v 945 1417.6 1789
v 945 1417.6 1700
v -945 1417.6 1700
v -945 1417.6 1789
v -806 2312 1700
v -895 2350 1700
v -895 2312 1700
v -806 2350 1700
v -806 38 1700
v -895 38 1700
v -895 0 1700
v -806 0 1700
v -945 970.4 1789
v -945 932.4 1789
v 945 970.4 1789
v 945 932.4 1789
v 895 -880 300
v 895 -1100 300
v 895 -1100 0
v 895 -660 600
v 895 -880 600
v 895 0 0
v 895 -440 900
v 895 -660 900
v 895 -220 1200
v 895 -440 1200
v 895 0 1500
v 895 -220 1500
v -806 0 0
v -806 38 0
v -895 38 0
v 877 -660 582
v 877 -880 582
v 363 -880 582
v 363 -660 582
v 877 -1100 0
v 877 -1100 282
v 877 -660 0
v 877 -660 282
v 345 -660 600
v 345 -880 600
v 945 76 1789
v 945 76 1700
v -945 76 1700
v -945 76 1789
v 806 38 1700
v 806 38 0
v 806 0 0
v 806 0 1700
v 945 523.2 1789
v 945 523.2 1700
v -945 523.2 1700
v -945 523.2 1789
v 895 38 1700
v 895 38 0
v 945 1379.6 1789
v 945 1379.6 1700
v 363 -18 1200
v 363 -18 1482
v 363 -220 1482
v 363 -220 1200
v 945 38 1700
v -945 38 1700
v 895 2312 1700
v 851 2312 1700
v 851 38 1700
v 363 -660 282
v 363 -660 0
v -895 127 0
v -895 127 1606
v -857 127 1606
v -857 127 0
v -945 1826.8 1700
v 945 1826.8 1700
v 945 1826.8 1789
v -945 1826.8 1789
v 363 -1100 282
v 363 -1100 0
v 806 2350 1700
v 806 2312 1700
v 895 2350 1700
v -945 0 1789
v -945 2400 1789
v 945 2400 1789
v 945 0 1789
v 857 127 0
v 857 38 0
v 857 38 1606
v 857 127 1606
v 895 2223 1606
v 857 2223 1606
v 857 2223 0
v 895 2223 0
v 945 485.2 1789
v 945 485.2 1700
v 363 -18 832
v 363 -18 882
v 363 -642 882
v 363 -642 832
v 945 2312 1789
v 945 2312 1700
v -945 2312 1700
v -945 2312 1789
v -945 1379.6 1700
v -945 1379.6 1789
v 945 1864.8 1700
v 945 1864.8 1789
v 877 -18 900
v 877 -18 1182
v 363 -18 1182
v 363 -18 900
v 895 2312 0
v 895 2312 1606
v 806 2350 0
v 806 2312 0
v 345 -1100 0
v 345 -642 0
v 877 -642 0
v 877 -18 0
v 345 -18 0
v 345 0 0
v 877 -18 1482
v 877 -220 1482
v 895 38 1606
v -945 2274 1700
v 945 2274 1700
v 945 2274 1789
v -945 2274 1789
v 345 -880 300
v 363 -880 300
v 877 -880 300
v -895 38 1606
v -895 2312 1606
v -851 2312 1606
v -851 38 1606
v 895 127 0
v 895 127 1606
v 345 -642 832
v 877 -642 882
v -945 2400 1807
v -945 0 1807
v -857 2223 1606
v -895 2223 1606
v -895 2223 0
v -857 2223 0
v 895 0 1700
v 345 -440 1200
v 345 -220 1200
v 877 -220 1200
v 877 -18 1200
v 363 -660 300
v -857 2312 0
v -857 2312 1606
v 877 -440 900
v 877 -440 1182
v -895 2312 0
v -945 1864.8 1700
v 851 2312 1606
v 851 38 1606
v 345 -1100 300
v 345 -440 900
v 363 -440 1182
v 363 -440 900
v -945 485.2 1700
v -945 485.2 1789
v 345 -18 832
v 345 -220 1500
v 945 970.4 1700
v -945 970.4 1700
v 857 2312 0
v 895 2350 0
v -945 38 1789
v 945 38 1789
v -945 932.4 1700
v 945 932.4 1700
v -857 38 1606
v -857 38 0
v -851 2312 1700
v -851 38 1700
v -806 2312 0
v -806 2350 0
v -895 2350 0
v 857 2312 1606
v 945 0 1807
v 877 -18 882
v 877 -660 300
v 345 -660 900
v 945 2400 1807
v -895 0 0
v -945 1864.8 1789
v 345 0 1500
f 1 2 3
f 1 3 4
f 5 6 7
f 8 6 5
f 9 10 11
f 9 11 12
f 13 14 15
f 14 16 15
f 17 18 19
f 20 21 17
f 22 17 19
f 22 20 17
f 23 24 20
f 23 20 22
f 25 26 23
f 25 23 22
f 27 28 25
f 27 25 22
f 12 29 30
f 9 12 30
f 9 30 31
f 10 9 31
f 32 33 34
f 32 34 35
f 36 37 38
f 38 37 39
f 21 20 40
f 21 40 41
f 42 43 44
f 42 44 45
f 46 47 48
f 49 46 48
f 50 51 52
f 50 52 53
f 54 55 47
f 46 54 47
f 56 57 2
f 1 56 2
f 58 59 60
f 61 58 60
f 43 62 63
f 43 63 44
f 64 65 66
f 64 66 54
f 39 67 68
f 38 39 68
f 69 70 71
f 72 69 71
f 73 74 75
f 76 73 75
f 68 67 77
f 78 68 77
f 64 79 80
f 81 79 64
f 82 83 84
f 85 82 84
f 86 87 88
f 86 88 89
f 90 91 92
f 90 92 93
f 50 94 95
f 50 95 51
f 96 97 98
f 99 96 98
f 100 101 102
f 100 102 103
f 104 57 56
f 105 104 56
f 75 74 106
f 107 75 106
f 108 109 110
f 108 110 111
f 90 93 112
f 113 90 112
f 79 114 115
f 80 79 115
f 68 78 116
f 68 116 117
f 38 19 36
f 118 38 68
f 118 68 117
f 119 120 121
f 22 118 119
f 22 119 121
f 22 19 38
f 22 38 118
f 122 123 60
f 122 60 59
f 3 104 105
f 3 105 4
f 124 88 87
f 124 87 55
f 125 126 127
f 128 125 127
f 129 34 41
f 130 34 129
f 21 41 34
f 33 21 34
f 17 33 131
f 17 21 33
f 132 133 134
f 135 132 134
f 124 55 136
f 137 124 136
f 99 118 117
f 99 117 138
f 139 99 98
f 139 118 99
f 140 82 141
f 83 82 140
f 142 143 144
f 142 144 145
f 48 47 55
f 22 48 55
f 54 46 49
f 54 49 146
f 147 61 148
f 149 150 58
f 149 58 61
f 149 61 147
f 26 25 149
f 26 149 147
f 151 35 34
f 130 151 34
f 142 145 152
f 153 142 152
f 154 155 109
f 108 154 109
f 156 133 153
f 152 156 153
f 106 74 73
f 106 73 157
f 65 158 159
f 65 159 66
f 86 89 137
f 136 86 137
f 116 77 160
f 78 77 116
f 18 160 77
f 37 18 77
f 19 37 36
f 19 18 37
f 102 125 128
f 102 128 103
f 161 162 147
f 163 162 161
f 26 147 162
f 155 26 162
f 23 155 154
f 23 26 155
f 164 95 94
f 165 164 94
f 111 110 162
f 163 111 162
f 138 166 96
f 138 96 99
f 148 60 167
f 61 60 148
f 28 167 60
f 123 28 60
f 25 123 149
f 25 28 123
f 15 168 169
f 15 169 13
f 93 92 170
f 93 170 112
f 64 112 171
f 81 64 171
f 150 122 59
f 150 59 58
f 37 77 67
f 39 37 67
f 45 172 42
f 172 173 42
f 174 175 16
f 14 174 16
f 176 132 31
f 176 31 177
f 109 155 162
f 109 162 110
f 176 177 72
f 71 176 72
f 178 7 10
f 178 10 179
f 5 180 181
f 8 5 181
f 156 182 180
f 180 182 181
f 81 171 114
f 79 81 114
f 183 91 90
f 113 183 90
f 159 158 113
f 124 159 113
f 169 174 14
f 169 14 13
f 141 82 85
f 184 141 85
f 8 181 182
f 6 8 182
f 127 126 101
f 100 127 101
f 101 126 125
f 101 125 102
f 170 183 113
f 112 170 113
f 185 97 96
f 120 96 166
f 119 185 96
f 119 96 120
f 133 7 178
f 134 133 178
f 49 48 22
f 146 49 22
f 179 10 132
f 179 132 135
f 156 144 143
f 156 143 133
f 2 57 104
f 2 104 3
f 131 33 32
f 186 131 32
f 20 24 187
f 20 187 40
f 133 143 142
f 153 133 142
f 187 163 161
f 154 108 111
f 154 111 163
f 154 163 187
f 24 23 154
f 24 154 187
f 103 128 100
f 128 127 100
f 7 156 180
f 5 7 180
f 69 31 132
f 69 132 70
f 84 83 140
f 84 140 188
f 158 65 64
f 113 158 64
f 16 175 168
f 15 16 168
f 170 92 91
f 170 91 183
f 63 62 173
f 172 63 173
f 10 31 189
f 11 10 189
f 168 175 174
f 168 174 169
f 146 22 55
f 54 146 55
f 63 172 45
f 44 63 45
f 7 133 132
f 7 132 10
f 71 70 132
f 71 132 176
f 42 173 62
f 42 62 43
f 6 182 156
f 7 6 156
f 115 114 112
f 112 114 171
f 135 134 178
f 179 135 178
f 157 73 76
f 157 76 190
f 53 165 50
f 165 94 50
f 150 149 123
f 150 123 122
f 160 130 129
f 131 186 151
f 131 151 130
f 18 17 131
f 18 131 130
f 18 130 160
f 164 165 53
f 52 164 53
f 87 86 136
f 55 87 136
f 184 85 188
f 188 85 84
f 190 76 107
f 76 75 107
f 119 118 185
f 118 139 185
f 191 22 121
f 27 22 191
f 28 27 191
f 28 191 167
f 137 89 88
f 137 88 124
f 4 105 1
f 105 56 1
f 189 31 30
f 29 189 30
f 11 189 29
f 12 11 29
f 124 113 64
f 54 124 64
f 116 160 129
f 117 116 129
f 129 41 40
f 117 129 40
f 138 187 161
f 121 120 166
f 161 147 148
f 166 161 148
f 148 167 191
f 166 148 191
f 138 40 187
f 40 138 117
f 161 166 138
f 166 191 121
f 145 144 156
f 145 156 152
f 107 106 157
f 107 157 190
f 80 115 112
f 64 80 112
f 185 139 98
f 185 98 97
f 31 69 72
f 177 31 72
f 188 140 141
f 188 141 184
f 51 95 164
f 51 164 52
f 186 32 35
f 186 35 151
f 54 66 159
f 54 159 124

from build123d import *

# Parameters (mm, degrees)
F1_DEPTH      = 1700
F0_W          = 38
F0_H          = 89
F2_DEPTH      = 1606
F3_W          = 44
F3_H          = 94
F4_DEPTH      = 2274
F5_W          = 38
F5_H          = 89
F6_DEPTH      = 945
F6_DEPTH_BACK = 945
F7_W          = 1890
F7_H          = 2400
F8_DEPTH      = 18
F10_DEPTH     = 550
F12_DEPTH     = 18
F13_W         = 624
F13_H         = 50
F14_DEPTH     = 18


with BuildPart() as f1:
    # F0 (on Top) → F1 (new body)
    with BuildSketch(Plane.XY):
        Polygon((-806, 2350), (-895, 2350), (-895, 2312), (-857, 2312), (-806, 2312), align=None)
    extrude(amount=F1_DEPTH)


with BuildPart() as f1b:
    # F0 (on Top) → F1, piece 2 (new body)
    with BuildSketch(Plane.XY):
        Polygon((895, 2350), (806, 2350), (806, 2312), (857, 2312), (895, 2312), align=None)
    extrude(amount=F1_DEPTH)


with BuildPart() as f1c:
    # F0 (on Top) → F1, piece 3 (new body)
    with BuildSketch(Plane.XY):
        Polygon((895, 0), (895, 38), (857, 38), (806, 38), (806, 0), align=None)
    extrude(amount=F1_DEPTH)


with BuildPart() as f1d:
    # F0 (on Top) → F1, piece 4 (new body)
    with BuildSketch(Plane.XY):
        Polygon((-895, 38), (-895, 0), (-806, 0), (-806, 38), (-857, 38), align=None)
    extrude(amount=F1_DEPTH)


with BuildPart() as f2:
    # F0 (on Top) → F2 (new body)
    with BuildSketch(Plane.XY):
        with Locations((-876, 2267.5)):
            Rectangle(F0_W, F0_H)
    extrude(amount=F2_DEPTH)


with BuildPart() as f2b:
    # F0 (on Top) → F2, piece 2 (new body)
    with BuildSketch(Plane.XY):
        with Locations((876, 2267.5)):
            Rectangle(F0_W, F0_H)
    extrude(amount=F2_DEPTH)


with BuildPart() as f2c:
    # F0 (on Top) → F2, piece 3 (new body)
    with BuildSketch(Plane.XY):
        with Locations((876, 82.5)):
            Rectangle(F0_W, F0_H)
    extrude(amount=F2_DEPTH)


with BuildPart() as f2d:
    # F0 (on Top) → F2, piece 4 (new body)
    with BuildSketch(Plane.XY):
        with Locations((-876, 82.5)):
            Rectangle(F0_W, F0_H)
    extrude(amount=F2_DEPTH)


with BuildPart() as f4:
    # F3 (on face) → F4 (new body, through all)
    with BuildSketch(Plane.XZ.offset(-2312)):
        with Locations((-873, 1653)):
            Rectangle(F3_W, F3_H)
    extrude(amount=F4_DEPTH)


with BuildPart() as f4b:
    # F3 (on face) → F4, piece 2 (new body, through all)
    with BuildSketch(Plane.XZ.offset(-2312)):
        with Locations((873, 1653)):
            Rectangle(F3_W, F3_H)
    extrude(amount=F4_DEPTH)


with BuildPart() as f6:
    # F5 (on Right) → F6 (new body, two sides)
    with BuildSketch(Plane.YZ) as f6_sk:
        with Locations((504.2, 1744.5)):
            Rectangle(F5_W, F5_H)
    extrude(amount=F6_DEPTH)
    extrude(f6_sk.sketch, amount=-F6_DEPTH_BACK)


with BuildPart() as f6b:
    # F5 (on Right) → F6, piece 2 (new body, two sides)
    with BuildSketch(Plane.YZ) as f6_2_sk:
        with Locations((951.4, 1744.5)):
            Rectangle(F5_W, F5_H)
    extrude(amount=F6_DEPTH)
    extrude(f6_2_sk.sketch, amount=-F6_DEPTH_BACK)


with BuildPart() as f6c:
    # F5 (on Right) → F6, piece 3 (new body, two sides)
    with BuildSketch(Plane.YZ) as f6_3_sk:
        with Locations((1398.6, 1744.5)):
            Rectangle(F5_W, F5_H)
    extrude(amount=F6_DEPTH)
    extrude(f6_3_sk.sketch, amount=-F6_DEPTH_BACK)


with BuildPart() as f6d:
    # F5 (on Right) → F6, piece 4 (new body, two sides)
    with BuildSketch(Plane.YZ) as f6_4_sk:
        with Locations((1845.8, 1744.5)):
            Rectangle(F5_W, F5_H)
    extrude(amount=F6_DEPTH)
    extrude(f6_4_sk.sketch, amount=-F6_DEPTH_BACK)


with BuildPart() as f6e:
    # F5 (on Right) → F6, piece 5 (new body, two sides)
    with BuildSketch(Plane.YZ) as f6_5_sk:
        with Locations((57, 1744.5)):
            Rectangle(F5_W, F5_H)
    extrude(amount=F6_DEPTH)
    extrude(f6_5_sk.sketch, amount=-F6_DEPTH_BACK)


with BuildPart() as f6f:
    # F5 (on Right) → F6, piece 6 (new body, two sides)
    with BuildSketch(Plane.YZ) as f6_6_sk:
        with Locations((2293, 1744.5)):
            Rectangle(F5_W, F5_H)
    extrude(amount=F6_DEPTH)
    extrude(f6_6_sk.sketch, amount=-F6_DEPTH_BACK)


with BuildPart() as f8:
    # F7 (on face) → F8 (new body)
    with BuildSketch(Plane.XY.offset(1789)):
        with Locations((0, 1200)):
            Rectangle(F7_W, F7_H)
    extrude(amount=F8_DEPTH)


with BuildPart() as f10:
    # F9 (on face) → F10 (new body)
    with BuildSketch(Plane.YZ.offset(895)):
        Polygon((-660, 582), (-660, 600), (-880, 600), (-880, 582), (-862, 582), align=None)
        Polygon((-202, 1200), (-220, 1200), (-440, 1200), (-440, 1182), (-422, 1182), (-202, 1182), (-18, 1182), (-18, 1200), align=None)
        Polygon((-862, 282), (-660, 282), (-660, 300), (-862, 300), (-880, 300), (-1100, 300), (-1100, 282), (-1082, 282), align=None)
        Polygon((0, 1200), (0, 1500), (-220, 1500), (-220, 1482), (-202, 1482), (-18, 1482), (-18, 1200), (-18, 1182), (-18, 900), (-18, 882), (-18, 0), (0, 0), (0, 1182), align=None)
        Polygon((-660, 0), (-642, 0), (-642, 582), (-642, 882), (-422, 882), (-18, 882), (-18, 900), (-422, 900), (-440, 900), (-660, 900), (-660, 600), (-660, 582), (-660, 300), (-660, 282), align=None)
    extrude(amount=-F10_DEPTH)

    # F11 (on face) → F12 (join)
    with BuildSketch(Plane.YZ.offset(895)):
        Polygon((0, 0), (0, 1500), (-220, 1500), (-220, 1200), (-440, 1200), (-440, 900), (-660, 900), (-660, 600), (-880, 600), (-880, 300), (-1100, 300), (-1100, 0), align=None)
    extrude(amount=-F12_DEPTH)

    # F13 (on face) → F14 (join)
    with BuildSketch(Plane(origin=(345, 0, 0), x_dir=(0, -1, 0), z_dir=(-1, 0, 0))):
        Polygon((220, 1500), (0, 1500), (0, 900), (440, 900), (440, 1200), (220, 1200), align=None)
        Polygon((880, 600), (660, 600), (660, 0), (1100, 0), (1100, 300), (880, 300), align=None)
        with Locations((330, 857)):
            Rectangle(F13_W, F13_H)
    extrude(amount=-F14_DEPTH)


solid = Compound([f1.part, f1b.part, f1c.part, f1d.part, f2.part, f2b.part, f2c.part, f2d.part, f4.part, f4b.part, f6.part, f6b.part, f6c.part, f6d.part, f6e.part, f6f.part, f8.part, f10.part])
